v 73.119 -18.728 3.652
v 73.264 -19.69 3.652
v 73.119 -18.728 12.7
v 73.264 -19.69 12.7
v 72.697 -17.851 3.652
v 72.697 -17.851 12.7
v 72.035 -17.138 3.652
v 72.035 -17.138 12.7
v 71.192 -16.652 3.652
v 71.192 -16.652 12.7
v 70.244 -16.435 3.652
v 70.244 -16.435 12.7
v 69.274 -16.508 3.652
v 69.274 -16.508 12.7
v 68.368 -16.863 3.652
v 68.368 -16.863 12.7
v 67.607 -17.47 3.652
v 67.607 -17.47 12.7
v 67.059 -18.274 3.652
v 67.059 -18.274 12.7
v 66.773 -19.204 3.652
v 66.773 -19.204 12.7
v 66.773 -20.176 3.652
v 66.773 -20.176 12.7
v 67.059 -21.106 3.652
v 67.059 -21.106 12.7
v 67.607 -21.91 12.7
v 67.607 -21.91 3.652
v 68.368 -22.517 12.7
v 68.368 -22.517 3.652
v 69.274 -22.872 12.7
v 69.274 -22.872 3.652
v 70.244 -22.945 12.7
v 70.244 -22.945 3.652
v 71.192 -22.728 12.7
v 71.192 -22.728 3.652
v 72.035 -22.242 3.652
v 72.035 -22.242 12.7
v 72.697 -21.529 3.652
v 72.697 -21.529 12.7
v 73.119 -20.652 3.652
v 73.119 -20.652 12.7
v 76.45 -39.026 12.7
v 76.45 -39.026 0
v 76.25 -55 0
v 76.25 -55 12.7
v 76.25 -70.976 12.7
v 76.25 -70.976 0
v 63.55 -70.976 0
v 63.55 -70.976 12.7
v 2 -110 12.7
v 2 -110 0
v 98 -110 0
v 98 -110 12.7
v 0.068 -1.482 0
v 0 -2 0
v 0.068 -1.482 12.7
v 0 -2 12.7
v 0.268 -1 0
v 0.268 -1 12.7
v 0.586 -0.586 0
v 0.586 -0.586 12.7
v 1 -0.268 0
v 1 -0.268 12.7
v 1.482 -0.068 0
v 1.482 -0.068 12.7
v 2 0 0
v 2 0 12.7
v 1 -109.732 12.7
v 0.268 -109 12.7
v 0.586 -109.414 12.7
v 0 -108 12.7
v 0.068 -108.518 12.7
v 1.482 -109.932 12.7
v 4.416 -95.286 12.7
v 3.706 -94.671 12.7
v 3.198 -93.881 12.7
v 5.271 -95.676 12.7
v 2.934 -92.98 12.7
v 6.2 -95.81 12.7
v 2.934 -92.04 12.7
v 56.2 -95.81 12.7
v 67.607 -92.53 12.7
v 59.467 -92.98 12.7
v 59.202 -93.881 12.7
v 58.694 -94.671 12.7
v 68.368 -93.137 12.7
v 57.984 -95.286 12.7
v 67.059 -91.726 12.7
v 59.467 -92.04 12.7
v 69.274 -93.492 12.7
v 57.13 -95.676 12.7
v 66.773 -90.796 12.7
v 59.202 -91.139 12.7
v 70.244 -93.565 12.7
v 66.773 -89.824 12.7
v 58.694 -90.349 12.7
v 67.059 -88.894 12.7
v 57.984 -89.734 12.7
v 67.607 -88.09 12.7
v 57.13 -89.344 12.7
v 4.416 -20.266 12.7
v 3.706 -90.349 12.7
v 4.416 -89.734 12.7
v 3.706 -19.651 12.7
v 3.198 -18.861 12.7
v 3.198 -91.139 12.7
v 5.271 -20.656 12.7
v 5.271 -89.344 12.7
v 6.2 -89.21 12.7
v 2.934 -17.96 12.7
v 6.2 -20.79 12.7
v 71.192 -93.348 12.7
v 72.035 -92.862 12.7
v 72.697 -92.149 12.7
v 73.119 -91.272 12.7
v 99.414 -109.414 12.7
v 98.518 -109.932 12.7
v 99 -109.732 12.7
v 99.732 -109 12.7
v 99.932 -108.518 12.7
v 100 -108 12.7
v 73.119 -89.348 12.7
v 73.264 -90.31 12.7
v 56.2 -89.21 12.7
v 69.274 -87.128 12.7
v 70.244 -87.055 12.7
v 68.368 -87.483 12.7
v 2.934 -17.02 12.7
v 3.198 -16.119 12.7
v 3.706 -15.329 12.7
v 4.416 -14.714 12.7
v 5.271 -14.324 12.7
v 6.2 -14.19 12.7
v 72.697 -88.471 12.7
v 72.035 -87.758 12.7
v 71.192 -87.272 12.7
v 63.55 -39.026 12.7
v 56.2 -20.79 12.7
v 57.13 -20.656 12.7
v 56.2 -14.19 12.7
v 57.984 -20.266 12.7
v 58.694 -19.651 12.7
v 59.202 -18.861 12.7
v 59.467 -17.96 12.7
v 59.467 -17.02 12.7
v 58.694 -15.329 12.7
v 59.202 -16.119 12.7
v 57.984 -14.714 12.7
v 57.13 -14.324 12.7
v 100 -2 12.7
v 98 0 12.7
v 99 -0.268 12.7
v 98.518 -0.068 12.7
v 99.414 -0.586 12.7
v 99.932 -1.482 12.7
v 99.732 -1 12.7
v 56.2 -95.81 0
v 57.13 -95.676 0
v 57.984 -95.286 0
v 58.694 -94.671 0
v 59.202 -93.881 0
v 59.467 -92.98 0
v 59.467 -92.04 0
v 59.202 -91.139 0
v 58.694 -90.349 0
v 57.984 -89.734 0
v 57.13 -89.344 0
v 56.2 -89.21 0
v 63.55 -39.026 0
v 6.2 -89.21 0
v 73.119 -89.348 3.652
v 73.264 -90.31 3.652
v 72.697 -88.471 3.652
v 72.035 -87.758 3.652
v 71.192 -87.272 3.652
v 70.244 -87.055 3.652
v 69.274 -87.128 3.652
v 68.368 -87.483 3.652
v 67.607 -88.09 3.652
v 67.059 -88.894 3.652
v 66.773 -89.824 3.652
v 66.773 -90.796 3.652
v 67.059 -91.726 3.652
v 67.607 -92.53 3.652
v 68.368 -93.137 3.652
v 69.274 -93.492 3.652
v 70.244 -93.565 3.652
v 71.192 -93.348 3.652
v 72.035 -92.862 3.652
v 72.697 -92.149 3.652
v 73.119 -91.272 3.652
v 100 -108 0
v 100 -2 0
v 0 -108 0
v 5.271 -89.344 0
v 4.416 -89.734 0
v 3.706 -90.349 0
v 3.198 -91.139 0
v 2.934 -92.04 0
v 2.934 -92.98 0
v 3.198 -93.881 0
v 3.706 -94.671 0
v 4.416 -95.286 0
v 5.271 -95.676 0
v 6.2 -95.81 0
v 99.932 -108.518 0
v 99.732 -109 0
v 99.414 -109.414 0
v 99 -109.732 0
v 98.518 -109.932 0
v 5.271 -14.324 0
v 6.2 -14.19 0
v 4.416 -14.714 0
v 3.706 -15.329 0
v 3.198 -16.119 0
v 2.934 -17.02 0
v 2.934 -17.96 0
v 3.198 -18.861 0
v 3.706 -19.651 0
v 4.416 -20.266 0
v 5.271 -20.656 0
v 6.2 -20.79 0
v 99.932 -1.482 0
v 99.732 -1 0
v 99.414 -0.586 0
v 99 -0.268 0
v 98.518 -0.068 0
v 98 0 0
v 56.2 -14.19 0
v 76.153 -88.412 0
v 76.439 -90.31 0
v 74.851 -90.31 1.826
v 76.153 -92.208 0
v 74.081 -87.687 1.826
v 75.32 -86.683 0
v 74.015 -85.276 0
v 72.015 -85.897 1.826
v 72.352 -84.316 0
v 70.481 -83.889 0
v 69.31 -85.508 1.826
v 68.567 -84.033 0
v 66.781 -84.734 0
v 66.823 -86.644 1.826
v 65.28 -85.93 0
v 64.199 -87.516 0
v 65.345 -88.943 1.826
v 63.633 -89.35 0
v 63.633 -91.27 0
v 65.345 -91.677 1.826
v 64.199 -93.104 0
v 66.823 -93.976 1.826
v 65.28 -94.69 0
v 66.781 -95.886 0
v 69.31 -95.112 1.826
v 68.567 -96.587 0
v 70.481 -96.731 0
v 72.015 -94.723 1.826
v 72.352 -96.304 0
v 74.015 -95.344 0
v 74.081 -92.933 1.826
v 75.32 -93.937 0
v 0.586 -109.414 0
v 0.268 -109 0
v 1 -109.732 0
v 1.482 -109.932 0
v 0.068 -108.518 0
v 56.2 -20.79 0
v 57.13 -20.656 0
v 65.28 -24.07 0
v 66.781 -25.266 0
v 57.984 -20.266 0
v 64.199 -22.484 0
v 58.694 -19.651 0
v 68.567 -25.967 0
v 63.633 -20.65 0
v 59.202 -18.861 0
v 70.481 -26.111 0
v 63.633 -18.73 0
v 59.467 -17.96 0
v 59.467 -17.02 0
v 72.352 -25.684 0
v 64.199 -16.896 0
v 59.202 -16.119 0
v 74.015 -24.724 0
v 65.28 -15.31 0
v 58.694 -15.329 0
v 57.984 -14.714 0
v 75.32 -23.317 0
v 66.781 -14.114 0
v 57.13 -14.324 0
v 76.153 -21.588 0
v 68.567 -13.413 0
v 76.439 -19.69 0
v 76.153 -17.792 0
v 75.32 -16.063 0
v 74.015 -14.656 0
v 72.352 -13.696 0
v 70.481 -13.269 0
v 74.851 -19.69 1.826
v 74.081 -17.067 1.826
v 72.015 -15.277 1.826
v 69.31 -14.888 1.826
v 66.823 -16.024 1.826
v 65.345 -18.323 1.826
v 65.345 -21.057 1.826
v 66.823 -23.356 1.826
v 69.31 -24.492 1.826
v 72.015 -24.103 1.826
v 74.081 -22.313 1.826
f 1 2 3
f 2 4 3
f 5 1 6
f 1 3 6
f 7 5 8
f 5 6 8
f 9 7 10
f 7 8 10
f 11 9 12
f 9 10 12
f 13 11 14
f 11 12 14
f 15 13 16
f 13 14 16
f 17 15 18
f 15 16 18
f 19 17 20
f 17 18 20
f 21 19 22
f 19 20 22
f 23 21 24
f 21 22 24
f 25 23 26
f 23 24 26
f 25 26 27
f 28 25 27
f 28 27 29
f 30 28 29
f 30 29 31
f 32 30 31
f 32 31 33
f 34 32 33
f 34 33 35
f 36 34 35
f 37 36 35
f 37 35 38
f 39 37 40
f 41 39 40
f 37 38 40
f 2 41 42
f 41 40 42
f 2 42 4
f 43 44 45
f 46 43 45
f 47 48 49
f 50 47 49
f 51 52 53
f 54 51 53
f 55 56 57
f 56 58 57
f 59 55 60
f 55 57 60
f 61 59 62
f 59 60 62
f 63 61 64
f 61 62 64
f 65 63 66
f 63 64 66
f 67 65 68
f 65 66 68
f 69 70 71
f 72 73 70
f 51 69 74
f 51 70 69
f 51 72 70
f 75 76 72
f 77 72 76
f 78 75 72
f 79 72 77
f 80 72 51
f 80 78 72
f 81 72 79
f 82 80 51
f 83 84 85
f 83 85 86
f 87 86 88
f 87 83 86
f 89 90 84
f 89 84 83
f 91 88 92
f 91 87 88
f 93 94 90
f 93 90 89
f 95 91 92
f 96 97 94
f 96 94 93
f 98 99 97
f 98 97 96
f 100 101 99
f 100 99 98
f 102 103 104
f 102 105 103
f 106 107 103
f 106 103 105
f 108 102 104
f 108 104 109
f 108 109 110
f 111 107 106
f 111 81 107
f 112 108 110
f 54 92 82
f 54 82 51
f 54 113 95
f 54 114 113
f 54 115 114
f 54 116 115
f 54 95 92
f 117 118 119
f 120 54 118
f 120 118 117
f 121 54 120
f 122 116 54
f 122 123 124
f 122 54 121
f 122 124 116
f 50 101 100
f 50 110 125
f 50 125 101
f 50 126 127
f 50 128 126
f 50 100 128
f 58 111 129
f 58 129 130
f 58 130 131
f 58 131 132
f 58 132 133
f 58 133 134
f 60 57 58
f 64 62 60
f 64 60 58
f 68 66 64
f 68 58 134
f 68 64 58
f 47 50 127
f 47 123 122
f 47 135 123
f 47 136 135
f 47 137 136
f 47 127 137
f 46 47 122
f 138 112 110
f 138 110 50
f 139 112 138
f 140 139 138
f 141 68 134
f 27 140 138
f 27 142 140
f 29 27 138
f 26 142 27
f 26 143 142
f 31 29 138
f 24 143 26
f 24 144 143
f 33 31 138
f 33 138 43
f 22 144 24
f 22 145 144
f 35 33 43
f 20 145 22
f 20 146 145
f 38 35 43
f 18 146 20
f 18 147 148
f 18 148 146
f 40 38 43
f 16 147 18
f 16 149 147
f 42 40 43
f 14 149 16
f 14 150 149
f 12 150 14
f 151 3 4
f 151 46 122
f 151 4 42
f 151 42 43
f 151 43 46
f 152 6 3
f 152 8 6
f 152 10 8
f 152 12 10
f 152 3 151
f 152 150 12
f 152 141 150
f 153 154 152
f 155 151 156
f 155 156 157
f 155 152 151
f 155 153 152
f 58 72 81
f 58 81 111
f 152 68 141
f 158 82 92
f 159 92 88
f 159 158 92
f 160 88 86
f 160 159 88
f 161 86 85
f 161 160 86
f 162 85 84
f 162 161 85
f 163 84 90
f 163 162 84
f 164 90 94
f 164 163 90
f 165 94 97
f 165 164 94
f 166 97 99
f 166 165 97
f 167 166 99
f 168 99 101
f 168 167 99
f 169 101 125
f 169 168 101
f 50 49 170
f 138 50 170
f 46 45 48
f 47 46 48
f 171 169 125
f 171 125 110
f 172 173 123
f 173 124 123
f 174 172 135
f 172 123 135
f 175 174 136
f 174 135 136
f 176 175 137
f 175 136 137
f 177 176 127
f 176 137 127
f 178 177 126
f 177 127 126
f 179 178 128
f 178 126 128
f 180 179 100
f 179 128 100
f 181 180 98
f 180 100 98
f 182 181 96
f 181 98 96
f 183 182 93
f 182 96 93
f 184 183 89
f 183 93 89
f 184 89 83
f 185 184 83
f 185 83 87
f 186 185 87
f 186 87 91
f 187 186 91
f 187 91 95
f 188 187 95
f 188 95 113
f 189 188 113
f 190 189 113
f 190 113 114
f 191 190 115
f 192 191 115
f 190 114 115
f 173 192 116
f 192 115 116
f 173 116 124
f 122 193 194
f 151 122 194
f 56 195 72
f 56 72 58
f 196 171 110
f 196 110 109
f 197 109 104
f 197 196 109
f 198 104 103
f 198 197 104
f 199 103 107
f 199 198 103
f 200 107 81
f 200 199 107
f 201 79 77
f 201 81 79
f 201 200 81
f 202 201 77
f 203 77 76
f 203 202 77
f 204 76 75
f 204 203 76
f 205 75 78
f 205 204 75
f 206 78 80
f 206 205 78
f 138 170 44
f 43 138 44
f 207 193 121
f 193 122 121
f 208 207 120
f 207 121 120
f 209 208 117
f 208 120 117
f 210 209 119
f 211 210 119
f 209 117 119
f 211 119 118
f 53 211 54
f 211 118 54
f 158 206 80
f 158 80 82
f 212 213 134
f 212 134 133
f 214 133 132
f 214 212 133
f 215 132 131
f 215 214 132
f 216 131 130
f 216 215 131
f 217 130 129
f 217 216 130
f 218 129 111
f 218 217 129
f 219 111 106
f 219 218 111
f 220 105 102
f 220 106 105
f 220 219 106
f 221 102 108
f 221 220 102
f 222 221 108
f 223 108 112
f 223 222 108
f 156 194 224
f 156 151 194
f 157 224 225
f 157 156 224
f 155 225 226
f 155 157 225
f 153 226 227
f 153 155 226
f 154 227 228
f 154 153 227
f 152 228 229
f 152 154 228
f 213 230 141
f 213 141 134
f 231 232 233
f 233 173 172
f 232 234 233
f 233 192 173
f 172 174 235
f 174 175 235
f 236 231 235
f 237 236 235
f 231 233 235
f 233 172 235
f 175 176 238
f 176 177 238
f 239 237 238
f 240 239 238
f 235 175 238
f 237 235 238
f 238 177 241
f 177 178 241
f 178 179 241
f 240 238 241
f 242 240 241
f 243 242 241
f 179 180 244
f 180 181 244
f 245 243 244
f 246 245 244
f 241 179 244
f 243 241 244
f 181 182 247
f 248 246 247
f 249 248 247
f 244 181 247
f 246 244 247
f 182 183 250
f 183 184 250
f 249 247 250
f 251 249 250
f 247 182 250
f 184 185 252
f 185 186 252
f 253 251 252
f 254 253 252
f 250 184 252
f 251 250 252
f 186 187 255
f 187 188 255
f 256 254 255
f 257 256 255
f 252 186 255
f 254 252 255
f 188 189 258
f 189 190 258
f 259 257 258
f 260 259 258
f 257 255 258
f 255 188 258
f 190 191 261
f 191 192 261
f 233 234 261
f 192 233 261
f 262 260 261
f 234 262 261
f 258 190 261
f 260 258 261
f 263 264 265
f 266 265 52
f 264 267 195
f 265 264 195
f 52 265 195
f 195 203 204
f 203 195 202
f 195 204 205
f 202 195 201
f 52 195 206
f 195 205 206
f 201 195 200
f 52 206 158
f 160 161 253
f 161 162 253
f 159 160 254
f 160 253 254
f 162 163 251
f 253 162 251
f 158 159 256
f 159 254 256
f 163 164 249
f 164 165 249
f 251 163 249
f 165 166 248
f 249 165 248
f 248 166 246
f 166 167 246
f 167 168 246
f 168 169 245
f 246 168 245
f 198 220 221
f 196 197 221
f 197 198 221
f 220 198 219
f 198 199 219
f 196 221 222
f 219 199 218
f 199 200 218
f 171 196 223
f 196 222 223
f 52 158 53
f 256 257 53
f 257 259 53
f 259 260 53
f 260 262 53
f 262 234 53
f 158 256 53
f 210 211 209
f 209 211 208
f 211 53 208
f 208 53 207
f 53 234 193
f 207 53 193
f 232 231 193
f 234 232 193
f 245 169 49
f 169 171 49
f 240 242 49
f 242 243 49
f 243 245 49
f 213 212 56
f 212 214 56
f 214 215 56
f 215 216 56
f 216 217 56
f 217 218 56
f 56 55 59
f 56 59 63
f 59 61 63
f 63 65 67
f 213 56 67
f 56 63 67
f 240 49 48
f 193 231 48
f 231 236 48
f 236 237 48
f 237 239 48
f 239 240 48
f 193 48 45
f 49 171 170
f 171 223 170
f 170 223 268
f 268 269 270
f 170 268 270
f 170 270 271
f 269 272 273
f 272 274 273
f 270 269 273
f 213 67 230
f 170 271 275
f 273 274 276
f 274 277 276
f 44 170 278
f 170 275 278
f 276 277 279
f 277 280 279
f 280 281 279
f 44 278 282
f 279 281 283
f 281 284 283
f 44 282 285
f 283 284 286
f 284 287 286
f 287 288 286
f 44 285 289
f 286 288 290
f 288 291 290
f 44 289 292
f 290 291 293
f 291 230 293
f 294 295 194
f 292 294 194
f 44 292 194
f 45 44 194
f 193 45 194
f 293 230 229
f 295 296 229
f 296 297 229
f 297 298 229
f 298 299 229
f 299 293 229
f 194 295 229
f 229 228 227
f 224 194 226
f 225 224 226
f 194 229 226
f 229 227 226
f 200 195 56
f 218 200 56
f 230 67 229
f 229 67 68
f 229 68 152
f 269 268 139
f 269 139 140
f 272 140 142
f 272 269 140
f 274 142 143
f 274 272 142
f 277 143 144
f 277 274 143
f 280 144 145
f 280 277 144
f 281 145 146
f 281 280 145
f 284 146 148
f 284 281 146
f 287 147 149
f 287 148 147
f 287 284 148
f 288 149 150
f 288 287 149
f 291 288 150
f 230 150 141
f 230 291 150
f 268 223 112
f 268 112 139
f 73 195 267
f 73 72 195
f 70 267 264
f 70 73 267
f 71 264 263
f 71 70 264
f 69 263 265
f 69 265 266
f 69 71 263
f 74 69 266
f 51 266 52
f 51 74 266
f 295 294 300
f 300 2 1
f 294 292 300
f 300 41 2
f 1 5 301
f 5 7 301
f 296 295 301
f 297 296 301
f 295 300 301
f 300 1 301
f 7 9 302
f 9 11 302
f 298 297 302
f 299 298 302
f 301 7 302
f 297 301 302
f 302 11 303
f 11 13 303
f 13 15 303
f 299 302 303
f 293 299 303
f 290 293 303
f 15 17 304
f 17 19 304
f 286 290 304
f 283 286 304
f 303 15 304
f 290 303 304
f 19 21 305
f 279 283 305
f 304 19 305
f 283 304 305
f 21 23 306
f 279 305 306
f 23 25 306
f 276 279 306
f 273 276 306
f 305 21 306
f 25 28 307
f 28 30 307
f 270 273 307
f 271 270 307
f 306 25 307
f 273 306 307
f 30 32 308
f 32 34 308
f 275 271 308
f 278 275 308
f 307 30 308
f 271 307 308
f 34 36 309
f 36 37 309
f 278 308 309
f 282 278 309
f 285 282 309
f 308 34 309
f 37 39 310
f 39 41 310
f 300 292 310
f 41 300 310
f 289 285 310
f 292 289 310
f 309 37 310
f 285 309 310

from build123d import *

# Parameters (mm, degrees)
SKETCH1_W                                        = 100
SKETCH1_H                                        = 110
BOSS_EXTRUDE2_DEPTH                              = 12.7
CSK_FOR_1_4_FLAT_HEAD_MACHINE_SCREW3_D           = 6.5278
CSK_FOR_1_4_FLAT_HEAD_MACHINE_SCREW3_CSINK_D     = 12.8778
CSK_FOR_1_4_FLAT_HEAD_MACHINE_SCREW3_CSINK_ANGLE = 82
CSK_FOR_1_4_FLAT_HEAD_MACHINE_SCREW4_D           = 6.5278
CSK_FOR_1_4_FLAT_HEAD_MACHINE_SCREW4_CSINK_D     = 12.8778
CSK_FOR_1_4_FLAT_HEAD_MACHINE_SCREW4_CSINK_ANGLE = 82
FILLET1_R                                        = 2
CUT_EXTRUDE1_DEPTH                               = 150.202178268


with BuildPart() as part:
    # Sketch1 → Boss-Extrude2 (new body)
    with BuildSketch(Plane.XY):
        with Locations((50, -55)):
            Rectangle(SKETCH1_W, SKETCH1_H)
        Polygon((70, -39.025625978), (76.45, -39.025625978), (76.25, -55), (76.25, -70.975625978), (70, -70.975625978), (63.55, -70.975625978), (63.55, -39.025625978), align=None, mode=Mode.SUBTRACT)
    extrude(amount=BOSS_EXTRUDE2_DEPTH)

    # CSK for 1/4 Flat Head Machine Screw3 (through all)
    with Locations(Plane(origin=(0, 0, 0), x_dir=(-1, 0, 0), z_dir=(0, 0, -1))):
        with Locations((-70, -90.31)):
            CounterSinkHole(CSK_FOR_1_4_FLAT_HEAD_MACHINE_SCREW3_D / 2, CSK_FOR_1_4_FLAT_HEAD_MACHINE_SCREW3_CSINK_D / 2, counter_sink_angle=CSK_FOR_1_4_FLAT_HEAD_MACHINE_SCREW3_CSINK_ANGLE)

    # CSK for 1/4 Flat Head Machine Screw4 (through all)
    with Locations(Plane(origin=(0, 0, 0), x_dir=(-1, 0, 0), z_dir=(0, 0, -1))):
        with Locations((-70, -19.69)):
            CounterSinkHole(CSK_FOR_1_4_FLAT_HEAD_MACHINE_SCREW4_D / 2, CSK_FOR_1_4_FLAT_HEAD_MACHINE_SCREW4_CSINK_D / 2, counter_sink_angle=CSK_FOR_1_4_FLAT_HEAD_MACHINE_SCREW4_CSINK_ANGLE)

    # Fillet1
    fillet1_edges = [part.edges().sort_by_distance(p)[0] for p in [
        (0, 0, 6.35),
        (100, 0, 6.35),
        (100, -110, 6.35),
        (0, -110, 6.35),
    ]]
    fillet(fillet1_edges, radius=FILLET1_R)

    # Sketch15 → Cut-Extrude1 (cut, through all)
    with BuildSketch(Plane(origin=(0, 0, 0), x_dir=(-1, 0, 0), z_dir=(0, 0, -1))):
        with BuildLine():
            Line((-56.200253658, -14.19), (-6.200253658, -14.19))
            ThreePointArc((-6.200253658, -14.19), (-2.900253658, -17.49), (-6.200253658, -20.79))
            Line((-6.200253658, -20.79), (-56.200253658, -20.79))
            ThreePointArc((-56.200253658, -20.79), (-59.500253658, -17.49), (-56.200253658, -14.19))
        make_face()
        with BuildLine():
            Line((-56.200253658, -89.21), (-6.200253658, -89.21))
            ThreePointArc((-6.200253658, -89.21), (-2.900253658, -92.51), (-6.200253658, -95.81))
            Line((-6.200253658, -95.81), (-56.200253658, -95.81))
            ThreePointArc((-56.200253658, -95.81), (-59.500253658, -92.51), (-56.200253658, -89.21))
        make_face()
    extrude(amount=-CUT_EXTRUDE1_DEPTH, mode=Mode.SUBTRACT)


solid = part.part
